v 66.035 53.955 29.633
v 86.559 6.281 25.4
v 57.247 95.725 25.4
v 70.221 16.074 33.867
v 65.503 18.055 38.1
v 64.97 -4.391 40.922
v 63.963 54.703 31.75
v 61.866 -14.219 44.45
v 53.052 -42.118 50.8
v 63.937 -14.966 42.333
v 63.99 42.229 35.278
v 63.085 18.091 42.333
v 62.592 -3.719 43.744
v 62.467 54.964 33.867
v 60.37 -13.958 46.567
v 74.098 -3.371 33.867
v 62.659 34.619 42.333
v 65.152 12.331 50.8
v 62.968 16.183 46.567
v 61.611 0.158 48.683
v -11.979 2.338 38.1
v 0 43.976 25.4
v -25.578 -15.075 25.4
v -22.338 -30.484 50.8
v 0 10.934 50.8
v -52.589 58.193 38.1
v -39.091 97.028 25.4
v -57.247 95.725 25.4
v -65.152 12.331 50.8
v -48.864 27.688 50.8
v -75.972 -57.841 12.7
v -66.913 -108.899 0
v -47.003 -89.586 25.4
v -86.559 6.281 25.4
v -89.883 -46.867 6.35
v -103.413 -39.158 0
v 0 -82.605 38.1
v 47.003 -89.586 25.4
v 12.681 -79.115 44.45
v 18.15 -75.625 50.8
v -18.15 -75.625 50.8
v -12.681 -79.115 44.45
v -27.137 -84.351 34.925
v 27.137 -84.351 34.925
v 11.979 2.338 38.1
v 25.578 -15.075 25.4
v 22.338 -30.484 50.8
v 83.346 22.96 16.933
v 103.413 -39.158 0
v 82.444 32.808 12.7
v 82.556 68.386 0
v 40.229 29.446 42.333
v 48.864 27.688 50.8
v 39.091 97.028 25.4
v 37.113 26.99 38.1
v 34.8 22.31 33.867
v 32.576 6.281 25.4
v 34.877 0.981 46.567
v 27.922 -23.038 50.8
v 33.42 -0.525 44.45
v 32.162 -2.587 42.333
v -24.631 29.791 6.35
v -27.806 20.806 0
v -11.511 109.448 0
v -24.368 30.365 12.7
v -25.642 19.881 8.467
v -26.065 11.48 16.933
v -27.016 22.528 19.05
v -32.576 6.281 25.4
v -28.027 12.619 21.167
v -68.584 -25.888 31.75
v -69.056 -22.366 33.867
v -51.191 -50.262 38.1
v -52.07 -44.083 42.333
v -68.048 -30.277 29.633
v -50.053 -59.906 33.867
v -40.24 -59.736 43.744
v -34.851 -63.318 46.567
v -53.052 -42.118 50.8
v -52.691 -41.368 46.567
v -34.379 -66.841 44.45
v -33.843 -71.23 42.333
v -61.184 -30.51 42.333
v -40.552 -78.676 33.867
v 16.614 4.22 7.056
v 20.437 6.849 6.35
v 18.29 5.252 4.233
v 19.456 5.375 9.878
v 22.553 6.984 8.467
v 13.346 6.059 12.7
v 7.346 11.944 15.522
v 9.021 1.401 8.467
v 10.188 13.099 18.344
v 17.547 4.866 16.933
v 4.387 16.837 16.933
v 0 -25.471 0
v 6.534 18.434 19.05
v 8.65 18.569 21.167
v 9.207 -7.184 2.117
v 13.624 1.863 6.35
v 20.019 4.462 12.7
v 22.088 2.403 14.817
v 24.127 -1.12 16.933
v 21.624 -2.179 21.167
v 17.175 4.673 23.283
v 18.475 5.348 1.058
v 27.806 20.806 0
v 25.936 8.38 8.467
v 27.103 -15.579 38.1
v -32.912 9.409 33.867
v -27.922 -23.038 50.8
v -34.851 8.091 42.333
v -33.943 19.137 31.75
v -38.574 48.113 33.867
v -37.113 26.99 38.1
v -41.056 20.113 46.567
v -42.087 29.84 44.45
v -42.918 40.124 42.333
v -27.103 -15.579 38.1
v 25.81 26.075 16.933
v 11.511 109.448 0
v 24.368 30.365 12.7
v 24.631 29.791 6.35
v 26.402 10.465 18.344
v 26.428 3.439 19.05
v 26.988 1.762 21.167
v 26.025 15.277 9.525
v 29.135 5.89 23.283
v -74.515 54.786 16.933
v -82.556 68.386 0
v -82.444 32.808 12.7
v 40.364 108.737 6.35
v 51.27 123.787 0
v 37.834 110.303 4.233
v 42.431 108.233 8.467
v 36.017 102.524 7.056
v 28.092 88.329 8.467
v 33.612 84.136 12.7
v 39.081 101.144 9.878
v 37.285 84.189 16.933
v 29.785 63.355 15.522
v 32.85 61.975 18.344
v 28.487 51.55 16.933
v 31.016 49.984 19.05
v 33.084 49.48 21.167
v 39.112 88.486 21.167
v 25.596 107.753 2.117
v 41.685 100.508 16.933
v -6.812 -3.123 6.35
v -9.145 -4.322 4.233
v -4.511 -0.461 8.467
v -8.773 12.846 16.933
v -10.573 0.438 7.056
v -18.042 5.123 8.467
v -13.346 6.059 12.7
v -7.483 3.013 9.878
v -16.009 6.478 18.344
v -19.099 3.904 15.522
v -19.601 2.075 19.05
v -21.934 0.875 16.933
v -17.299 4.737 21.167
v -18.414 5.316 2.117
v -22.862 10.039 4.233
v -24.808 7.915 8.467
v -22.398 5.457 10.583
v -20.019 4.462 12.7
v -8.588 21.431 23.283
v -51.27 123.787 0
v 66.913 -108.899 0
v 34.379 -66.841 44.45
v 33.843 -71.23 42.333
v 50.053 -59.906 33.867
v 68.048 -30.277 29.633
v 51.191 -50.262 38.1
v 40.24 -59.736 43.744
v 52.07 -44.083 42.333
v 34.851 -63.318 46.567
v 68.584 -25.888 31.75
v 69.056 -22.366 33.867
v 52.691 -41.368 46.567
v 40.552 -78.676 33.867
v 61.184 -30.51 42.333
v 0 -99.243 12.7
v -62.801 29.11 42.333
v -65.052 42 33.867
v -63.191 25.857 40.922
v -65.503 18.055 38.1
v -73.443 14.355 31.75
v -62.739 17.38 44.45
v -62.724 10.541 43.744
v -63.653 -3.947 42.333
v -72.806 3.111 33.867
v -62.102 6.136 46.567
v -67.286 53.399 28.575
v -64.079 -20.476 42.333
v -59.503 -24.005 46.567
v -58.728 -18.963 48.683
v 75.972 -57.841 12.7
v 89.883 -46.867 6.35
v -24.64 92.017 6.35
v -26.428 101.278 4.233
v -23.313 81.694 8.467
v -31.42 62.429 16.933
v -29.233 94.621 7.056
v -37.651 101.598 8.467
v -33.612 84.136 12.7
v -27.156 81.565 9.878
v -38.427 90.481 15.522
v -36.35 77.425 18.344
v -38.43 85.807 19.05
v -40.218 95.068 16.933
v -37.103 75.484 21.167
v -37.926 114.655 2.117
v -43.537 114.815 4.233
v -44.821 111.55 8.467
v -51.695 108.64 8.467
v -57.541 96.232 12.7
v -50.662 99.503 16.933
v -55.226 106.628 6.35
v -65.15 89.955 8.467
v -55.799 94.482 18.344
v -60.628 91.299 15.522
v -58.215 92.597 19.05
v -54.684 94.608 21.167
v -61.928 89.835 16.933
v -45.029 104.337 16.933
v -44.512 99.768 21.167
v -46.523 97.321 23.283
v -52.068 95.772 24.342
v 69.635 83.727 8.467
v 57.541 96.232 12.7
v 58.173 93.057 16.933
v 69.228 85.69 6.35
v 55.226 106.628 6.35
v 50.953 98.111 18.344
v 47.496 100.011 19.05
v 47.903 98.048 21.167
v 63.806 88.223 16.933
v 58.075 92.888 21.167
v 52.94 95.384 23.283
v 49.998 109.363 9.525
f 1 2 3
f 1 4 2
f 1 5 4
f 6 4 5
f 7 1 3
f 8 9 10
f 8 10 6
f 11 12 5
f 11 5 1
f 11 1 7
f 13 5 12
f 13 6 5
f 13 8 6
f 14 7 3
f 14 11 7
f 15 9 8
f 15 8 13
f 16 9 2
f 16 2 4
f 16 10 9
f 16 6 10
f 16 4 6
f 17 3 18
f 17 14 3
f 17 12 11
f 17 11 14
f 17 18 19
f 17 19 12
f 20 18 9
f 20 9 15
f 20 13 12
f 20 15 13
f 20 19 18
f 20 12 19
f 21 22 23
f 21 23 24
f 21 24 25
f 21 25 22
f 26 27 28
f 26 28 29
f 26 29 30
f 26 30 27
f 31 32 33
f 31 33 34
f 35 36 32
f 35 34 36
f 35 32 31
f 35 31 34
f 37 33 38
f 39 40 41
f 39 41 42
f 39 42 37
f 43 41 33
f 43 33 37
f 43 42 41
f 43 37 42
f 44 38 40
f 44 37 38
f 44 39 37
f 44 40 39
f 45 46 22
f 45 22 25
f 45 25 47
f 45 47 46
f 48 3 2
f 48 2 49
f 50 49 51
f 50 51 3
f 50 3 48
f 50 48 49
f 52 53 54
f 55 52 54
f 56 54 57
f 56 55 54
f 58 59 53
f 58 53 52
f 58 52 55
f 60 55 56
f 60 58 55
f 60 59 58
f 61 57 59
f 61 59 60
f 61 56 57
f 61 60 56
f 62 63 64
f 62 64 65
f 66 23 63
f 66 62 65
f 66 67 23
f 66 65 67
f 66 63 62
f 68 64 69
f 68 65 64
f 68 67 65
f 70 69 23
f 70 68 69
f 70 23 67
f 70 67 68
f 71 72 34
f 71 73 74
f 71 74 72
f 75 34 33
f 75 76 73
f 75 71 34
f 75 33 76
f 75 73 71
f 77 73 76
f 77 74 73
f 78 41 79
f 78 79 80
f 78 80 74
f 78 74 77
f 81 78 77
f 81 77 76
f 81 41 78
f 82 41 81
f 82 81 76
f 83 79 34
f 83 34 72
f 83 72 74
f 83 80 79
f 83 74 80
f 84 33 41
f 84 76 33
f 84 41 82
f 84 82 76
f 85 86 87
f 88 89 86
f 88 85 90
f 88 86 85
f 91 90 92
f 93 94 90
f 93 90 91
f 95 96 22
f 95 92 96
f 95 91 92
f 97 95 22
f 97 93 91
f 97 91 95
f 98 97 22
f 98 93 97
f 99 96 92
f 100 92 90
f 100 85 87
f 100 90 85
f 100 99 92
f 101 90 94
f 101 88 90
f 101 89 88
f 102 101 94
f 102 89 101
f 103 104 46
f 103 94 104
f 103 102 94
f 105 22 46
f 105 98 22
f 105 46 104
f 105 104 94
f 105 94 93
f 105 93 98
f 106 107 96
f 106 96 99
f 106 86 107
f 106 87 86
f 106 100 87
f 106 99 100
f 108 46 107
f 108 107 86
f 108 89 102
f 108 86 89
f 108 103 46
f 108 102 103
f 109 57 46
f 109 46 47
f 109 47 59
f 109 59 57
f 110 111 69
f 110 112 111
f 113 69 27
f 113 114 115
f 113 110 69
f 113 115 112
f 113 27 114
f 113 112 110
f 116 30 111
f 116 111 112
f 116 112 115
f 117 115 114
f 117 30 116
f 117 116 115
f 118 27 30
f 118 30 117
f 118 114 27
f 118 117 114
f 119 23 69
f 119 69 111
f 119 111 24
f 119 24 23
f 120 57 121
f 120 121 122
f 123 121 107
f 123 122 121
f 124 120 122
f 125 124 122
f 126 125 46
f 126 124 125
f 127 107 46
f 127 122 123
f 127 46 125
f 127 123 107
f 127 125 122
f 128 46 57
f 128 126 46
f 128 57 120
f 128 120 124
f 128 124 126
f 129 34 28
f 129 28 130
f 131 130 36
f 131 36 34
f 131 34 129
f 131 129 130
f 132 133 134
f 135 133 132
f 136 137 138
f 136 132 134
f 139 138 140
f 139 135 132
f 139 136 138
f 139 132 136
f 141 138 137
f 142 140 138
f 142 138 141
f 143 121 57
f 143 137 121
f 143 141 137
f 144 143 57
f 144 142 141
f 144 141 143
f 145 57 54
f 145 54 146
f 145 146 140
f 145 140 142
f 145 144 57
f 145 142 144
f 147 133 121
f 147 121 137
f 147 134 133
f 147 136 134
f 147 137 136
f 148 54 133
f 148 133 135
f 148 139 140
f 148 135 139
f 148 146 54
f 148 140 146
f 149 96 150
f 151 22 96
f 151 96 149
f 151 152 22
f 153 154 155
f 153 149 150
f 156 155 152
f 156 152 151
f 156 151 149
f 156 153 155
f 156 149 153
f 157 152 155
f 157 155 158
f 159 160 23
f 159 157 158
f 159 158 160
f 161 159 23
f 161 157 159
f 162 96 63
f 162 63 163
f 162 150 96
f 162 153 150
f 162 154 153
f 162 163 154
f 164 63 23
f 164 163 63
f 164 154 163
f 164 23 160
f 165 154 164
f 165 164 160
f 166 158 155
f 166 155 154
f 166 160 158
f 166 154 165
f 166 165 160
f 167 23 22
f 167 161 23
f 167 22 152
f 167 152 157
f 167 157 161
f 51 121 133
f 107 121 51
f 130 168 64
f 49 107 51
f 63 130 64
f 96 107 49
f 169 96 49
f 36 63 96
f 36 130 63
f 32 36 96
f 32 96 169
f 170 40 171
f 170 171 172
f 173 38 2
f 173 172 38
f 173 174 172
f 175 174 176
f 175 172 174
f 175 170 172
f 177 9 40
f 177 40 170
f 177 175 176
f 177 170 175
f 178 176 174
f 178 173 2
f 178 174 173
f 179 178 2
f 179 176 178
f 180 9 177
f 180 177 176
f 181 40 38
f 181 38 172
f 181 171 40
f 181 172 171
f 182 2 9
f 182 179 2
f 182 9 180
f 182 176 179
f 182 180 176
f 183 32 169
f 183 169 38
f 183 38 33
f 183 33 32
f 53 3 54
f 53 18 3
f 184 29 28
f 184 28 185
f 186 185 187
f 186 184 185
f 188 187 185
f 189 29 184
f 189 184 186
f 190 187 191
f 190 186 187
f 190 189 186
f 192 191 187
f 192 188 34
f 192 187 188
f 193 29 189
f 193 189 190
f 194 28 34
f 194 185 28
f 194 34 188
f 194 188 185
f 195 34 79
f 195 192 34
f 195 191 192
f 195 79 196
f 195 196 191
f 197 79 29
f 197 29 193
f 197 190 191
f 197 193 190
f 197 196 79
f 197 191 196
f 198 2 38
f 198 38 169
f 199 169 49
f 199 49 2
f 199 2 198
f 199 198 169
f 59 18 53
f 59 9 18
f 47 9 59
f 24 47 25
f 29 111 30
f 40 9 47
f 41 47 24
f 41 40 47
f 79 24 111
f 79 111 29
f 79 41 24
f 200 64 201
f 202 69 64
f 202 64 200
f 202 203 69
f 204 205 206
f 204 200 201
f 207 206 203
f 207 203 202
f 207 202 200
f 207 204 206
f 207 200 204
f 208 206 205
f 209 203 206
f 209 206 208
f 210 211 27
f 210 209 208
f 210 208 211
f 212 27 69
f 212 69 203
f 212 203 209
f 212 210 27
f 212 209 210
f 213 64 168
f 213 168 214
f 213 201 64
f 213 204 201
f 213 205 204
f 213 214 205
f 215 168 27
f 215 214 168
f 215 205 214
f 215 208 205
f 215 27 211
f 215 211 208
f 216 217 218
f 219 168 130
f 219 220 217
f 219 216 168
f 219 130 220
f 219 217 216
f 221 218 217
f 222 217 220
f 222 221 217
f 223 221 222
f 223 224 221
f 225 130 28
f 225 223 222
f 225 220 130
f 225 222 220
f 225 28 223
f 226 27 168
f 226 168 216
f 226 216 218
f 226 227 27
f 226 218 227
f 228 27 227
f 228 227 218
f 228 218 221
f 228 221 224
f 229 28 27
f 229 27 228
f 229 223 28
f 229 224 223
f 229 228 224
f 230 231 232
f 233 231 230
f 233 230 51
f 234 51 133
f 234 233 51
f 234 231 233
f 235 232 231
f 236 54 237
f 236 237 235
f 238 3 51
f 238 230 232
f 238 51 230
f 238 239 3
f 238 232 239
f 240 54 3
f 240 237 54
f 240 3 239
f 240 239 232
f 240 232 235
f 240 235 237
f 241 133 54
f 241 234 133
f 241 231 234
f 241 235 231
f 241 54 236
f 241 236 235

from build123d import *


with BuildPart() as f3:
    # F0 (on Top) → F3 section 0
    with BuildSketch(Plane.XY):
        Polygon((-11.5114999935, 109.4481572509), (-51.2702353299, 123.7873733044), (-82.5557932258, 68.3858543634), (-103.4128367901, -39.1582660377), (-66.9130161405, -108.8989898562), (66.9130161405, -108.8989898562), (103.4128367901, -39.1582660377), (82.5557932258, 68.3858543634), (51.2702353299, 123.7873733044), (11.5114999935, 109.4481572509), (27.8060622513, 20.8057314157), (0, -25.4708286375), (-27.8060622513, 20.8057314157), align=None)
    # F2 (on offset) → F3 section 1
    with BuildSketch(Plane.XY.offset(25.4)):
        Polygon((-25.577528252, -15.0751416393), (-32.5760915875, 6.2807598151), (-39.0913076699, 97.0284417272), (-57.247491911, 95.7249212287), (-86.5593254566, 6.2807598151), (-47.0026470721, -89.586019516), (47.0026470721, -89.586019516), (86.5593254566, 6.2807598151), (57.247491911, 95.7249212287), (39.0913076699, 97.0284417272), (32.5760915875, 6.2807598151), (25.577528252, -15.0751416393), (0, 43.9759492874), align=None)
    loft()

    # F3_face (on face) → F6 section 0
    with BuildSketch(Plane(origin=(0, -9.0342573877, 25.4), x_dir=(1, 0, 0), z_dir=(0, 0, 1))):
        Polygon((57.247491911, 104.7591786164), (39.0913076699, 106.0626991149), (32.5760915875, 15.3150172028), (25.577528252, -6.0408842515), (0, 53.0102066751), (-25.577528252, -6.0408842515), (-32.5760915875, 15.3150172028), (-39.0913076699, 106.0626991149), (-57.247491911, 104.7591786164), (-86.5593254566, 15.3150172028), (-47.0026470721, -80.5517621283), (47.0026470721, -80.5517621283), (86.5593254566, 15.3150172028), align=None)
    # F5 (on offset) → F6 section 1
    with BuildSketch(Plane.XY.offset(50.8)):
        Polygon((22.3378892988, -30.4836854339), (0, 10.9344869852), (-22.3378892988, -30.4836854339), (-27.9223658144, -23.0377204716), (-48.8641373813, 27.6879053563), (-65.1521831751, 12.3306056485), (-53.0524924397, -42.1180017292), (-18.149536103, -75.6248384714), (18.149536103, -75.6248384714), (53.0524924397, -42.1180017292), (65.1521831751, 12.3306056485), (48.8641373813, 27.6879053563), (27.9223658144, -23.0377204716), align=None)
    loft()


solid = f3.part
